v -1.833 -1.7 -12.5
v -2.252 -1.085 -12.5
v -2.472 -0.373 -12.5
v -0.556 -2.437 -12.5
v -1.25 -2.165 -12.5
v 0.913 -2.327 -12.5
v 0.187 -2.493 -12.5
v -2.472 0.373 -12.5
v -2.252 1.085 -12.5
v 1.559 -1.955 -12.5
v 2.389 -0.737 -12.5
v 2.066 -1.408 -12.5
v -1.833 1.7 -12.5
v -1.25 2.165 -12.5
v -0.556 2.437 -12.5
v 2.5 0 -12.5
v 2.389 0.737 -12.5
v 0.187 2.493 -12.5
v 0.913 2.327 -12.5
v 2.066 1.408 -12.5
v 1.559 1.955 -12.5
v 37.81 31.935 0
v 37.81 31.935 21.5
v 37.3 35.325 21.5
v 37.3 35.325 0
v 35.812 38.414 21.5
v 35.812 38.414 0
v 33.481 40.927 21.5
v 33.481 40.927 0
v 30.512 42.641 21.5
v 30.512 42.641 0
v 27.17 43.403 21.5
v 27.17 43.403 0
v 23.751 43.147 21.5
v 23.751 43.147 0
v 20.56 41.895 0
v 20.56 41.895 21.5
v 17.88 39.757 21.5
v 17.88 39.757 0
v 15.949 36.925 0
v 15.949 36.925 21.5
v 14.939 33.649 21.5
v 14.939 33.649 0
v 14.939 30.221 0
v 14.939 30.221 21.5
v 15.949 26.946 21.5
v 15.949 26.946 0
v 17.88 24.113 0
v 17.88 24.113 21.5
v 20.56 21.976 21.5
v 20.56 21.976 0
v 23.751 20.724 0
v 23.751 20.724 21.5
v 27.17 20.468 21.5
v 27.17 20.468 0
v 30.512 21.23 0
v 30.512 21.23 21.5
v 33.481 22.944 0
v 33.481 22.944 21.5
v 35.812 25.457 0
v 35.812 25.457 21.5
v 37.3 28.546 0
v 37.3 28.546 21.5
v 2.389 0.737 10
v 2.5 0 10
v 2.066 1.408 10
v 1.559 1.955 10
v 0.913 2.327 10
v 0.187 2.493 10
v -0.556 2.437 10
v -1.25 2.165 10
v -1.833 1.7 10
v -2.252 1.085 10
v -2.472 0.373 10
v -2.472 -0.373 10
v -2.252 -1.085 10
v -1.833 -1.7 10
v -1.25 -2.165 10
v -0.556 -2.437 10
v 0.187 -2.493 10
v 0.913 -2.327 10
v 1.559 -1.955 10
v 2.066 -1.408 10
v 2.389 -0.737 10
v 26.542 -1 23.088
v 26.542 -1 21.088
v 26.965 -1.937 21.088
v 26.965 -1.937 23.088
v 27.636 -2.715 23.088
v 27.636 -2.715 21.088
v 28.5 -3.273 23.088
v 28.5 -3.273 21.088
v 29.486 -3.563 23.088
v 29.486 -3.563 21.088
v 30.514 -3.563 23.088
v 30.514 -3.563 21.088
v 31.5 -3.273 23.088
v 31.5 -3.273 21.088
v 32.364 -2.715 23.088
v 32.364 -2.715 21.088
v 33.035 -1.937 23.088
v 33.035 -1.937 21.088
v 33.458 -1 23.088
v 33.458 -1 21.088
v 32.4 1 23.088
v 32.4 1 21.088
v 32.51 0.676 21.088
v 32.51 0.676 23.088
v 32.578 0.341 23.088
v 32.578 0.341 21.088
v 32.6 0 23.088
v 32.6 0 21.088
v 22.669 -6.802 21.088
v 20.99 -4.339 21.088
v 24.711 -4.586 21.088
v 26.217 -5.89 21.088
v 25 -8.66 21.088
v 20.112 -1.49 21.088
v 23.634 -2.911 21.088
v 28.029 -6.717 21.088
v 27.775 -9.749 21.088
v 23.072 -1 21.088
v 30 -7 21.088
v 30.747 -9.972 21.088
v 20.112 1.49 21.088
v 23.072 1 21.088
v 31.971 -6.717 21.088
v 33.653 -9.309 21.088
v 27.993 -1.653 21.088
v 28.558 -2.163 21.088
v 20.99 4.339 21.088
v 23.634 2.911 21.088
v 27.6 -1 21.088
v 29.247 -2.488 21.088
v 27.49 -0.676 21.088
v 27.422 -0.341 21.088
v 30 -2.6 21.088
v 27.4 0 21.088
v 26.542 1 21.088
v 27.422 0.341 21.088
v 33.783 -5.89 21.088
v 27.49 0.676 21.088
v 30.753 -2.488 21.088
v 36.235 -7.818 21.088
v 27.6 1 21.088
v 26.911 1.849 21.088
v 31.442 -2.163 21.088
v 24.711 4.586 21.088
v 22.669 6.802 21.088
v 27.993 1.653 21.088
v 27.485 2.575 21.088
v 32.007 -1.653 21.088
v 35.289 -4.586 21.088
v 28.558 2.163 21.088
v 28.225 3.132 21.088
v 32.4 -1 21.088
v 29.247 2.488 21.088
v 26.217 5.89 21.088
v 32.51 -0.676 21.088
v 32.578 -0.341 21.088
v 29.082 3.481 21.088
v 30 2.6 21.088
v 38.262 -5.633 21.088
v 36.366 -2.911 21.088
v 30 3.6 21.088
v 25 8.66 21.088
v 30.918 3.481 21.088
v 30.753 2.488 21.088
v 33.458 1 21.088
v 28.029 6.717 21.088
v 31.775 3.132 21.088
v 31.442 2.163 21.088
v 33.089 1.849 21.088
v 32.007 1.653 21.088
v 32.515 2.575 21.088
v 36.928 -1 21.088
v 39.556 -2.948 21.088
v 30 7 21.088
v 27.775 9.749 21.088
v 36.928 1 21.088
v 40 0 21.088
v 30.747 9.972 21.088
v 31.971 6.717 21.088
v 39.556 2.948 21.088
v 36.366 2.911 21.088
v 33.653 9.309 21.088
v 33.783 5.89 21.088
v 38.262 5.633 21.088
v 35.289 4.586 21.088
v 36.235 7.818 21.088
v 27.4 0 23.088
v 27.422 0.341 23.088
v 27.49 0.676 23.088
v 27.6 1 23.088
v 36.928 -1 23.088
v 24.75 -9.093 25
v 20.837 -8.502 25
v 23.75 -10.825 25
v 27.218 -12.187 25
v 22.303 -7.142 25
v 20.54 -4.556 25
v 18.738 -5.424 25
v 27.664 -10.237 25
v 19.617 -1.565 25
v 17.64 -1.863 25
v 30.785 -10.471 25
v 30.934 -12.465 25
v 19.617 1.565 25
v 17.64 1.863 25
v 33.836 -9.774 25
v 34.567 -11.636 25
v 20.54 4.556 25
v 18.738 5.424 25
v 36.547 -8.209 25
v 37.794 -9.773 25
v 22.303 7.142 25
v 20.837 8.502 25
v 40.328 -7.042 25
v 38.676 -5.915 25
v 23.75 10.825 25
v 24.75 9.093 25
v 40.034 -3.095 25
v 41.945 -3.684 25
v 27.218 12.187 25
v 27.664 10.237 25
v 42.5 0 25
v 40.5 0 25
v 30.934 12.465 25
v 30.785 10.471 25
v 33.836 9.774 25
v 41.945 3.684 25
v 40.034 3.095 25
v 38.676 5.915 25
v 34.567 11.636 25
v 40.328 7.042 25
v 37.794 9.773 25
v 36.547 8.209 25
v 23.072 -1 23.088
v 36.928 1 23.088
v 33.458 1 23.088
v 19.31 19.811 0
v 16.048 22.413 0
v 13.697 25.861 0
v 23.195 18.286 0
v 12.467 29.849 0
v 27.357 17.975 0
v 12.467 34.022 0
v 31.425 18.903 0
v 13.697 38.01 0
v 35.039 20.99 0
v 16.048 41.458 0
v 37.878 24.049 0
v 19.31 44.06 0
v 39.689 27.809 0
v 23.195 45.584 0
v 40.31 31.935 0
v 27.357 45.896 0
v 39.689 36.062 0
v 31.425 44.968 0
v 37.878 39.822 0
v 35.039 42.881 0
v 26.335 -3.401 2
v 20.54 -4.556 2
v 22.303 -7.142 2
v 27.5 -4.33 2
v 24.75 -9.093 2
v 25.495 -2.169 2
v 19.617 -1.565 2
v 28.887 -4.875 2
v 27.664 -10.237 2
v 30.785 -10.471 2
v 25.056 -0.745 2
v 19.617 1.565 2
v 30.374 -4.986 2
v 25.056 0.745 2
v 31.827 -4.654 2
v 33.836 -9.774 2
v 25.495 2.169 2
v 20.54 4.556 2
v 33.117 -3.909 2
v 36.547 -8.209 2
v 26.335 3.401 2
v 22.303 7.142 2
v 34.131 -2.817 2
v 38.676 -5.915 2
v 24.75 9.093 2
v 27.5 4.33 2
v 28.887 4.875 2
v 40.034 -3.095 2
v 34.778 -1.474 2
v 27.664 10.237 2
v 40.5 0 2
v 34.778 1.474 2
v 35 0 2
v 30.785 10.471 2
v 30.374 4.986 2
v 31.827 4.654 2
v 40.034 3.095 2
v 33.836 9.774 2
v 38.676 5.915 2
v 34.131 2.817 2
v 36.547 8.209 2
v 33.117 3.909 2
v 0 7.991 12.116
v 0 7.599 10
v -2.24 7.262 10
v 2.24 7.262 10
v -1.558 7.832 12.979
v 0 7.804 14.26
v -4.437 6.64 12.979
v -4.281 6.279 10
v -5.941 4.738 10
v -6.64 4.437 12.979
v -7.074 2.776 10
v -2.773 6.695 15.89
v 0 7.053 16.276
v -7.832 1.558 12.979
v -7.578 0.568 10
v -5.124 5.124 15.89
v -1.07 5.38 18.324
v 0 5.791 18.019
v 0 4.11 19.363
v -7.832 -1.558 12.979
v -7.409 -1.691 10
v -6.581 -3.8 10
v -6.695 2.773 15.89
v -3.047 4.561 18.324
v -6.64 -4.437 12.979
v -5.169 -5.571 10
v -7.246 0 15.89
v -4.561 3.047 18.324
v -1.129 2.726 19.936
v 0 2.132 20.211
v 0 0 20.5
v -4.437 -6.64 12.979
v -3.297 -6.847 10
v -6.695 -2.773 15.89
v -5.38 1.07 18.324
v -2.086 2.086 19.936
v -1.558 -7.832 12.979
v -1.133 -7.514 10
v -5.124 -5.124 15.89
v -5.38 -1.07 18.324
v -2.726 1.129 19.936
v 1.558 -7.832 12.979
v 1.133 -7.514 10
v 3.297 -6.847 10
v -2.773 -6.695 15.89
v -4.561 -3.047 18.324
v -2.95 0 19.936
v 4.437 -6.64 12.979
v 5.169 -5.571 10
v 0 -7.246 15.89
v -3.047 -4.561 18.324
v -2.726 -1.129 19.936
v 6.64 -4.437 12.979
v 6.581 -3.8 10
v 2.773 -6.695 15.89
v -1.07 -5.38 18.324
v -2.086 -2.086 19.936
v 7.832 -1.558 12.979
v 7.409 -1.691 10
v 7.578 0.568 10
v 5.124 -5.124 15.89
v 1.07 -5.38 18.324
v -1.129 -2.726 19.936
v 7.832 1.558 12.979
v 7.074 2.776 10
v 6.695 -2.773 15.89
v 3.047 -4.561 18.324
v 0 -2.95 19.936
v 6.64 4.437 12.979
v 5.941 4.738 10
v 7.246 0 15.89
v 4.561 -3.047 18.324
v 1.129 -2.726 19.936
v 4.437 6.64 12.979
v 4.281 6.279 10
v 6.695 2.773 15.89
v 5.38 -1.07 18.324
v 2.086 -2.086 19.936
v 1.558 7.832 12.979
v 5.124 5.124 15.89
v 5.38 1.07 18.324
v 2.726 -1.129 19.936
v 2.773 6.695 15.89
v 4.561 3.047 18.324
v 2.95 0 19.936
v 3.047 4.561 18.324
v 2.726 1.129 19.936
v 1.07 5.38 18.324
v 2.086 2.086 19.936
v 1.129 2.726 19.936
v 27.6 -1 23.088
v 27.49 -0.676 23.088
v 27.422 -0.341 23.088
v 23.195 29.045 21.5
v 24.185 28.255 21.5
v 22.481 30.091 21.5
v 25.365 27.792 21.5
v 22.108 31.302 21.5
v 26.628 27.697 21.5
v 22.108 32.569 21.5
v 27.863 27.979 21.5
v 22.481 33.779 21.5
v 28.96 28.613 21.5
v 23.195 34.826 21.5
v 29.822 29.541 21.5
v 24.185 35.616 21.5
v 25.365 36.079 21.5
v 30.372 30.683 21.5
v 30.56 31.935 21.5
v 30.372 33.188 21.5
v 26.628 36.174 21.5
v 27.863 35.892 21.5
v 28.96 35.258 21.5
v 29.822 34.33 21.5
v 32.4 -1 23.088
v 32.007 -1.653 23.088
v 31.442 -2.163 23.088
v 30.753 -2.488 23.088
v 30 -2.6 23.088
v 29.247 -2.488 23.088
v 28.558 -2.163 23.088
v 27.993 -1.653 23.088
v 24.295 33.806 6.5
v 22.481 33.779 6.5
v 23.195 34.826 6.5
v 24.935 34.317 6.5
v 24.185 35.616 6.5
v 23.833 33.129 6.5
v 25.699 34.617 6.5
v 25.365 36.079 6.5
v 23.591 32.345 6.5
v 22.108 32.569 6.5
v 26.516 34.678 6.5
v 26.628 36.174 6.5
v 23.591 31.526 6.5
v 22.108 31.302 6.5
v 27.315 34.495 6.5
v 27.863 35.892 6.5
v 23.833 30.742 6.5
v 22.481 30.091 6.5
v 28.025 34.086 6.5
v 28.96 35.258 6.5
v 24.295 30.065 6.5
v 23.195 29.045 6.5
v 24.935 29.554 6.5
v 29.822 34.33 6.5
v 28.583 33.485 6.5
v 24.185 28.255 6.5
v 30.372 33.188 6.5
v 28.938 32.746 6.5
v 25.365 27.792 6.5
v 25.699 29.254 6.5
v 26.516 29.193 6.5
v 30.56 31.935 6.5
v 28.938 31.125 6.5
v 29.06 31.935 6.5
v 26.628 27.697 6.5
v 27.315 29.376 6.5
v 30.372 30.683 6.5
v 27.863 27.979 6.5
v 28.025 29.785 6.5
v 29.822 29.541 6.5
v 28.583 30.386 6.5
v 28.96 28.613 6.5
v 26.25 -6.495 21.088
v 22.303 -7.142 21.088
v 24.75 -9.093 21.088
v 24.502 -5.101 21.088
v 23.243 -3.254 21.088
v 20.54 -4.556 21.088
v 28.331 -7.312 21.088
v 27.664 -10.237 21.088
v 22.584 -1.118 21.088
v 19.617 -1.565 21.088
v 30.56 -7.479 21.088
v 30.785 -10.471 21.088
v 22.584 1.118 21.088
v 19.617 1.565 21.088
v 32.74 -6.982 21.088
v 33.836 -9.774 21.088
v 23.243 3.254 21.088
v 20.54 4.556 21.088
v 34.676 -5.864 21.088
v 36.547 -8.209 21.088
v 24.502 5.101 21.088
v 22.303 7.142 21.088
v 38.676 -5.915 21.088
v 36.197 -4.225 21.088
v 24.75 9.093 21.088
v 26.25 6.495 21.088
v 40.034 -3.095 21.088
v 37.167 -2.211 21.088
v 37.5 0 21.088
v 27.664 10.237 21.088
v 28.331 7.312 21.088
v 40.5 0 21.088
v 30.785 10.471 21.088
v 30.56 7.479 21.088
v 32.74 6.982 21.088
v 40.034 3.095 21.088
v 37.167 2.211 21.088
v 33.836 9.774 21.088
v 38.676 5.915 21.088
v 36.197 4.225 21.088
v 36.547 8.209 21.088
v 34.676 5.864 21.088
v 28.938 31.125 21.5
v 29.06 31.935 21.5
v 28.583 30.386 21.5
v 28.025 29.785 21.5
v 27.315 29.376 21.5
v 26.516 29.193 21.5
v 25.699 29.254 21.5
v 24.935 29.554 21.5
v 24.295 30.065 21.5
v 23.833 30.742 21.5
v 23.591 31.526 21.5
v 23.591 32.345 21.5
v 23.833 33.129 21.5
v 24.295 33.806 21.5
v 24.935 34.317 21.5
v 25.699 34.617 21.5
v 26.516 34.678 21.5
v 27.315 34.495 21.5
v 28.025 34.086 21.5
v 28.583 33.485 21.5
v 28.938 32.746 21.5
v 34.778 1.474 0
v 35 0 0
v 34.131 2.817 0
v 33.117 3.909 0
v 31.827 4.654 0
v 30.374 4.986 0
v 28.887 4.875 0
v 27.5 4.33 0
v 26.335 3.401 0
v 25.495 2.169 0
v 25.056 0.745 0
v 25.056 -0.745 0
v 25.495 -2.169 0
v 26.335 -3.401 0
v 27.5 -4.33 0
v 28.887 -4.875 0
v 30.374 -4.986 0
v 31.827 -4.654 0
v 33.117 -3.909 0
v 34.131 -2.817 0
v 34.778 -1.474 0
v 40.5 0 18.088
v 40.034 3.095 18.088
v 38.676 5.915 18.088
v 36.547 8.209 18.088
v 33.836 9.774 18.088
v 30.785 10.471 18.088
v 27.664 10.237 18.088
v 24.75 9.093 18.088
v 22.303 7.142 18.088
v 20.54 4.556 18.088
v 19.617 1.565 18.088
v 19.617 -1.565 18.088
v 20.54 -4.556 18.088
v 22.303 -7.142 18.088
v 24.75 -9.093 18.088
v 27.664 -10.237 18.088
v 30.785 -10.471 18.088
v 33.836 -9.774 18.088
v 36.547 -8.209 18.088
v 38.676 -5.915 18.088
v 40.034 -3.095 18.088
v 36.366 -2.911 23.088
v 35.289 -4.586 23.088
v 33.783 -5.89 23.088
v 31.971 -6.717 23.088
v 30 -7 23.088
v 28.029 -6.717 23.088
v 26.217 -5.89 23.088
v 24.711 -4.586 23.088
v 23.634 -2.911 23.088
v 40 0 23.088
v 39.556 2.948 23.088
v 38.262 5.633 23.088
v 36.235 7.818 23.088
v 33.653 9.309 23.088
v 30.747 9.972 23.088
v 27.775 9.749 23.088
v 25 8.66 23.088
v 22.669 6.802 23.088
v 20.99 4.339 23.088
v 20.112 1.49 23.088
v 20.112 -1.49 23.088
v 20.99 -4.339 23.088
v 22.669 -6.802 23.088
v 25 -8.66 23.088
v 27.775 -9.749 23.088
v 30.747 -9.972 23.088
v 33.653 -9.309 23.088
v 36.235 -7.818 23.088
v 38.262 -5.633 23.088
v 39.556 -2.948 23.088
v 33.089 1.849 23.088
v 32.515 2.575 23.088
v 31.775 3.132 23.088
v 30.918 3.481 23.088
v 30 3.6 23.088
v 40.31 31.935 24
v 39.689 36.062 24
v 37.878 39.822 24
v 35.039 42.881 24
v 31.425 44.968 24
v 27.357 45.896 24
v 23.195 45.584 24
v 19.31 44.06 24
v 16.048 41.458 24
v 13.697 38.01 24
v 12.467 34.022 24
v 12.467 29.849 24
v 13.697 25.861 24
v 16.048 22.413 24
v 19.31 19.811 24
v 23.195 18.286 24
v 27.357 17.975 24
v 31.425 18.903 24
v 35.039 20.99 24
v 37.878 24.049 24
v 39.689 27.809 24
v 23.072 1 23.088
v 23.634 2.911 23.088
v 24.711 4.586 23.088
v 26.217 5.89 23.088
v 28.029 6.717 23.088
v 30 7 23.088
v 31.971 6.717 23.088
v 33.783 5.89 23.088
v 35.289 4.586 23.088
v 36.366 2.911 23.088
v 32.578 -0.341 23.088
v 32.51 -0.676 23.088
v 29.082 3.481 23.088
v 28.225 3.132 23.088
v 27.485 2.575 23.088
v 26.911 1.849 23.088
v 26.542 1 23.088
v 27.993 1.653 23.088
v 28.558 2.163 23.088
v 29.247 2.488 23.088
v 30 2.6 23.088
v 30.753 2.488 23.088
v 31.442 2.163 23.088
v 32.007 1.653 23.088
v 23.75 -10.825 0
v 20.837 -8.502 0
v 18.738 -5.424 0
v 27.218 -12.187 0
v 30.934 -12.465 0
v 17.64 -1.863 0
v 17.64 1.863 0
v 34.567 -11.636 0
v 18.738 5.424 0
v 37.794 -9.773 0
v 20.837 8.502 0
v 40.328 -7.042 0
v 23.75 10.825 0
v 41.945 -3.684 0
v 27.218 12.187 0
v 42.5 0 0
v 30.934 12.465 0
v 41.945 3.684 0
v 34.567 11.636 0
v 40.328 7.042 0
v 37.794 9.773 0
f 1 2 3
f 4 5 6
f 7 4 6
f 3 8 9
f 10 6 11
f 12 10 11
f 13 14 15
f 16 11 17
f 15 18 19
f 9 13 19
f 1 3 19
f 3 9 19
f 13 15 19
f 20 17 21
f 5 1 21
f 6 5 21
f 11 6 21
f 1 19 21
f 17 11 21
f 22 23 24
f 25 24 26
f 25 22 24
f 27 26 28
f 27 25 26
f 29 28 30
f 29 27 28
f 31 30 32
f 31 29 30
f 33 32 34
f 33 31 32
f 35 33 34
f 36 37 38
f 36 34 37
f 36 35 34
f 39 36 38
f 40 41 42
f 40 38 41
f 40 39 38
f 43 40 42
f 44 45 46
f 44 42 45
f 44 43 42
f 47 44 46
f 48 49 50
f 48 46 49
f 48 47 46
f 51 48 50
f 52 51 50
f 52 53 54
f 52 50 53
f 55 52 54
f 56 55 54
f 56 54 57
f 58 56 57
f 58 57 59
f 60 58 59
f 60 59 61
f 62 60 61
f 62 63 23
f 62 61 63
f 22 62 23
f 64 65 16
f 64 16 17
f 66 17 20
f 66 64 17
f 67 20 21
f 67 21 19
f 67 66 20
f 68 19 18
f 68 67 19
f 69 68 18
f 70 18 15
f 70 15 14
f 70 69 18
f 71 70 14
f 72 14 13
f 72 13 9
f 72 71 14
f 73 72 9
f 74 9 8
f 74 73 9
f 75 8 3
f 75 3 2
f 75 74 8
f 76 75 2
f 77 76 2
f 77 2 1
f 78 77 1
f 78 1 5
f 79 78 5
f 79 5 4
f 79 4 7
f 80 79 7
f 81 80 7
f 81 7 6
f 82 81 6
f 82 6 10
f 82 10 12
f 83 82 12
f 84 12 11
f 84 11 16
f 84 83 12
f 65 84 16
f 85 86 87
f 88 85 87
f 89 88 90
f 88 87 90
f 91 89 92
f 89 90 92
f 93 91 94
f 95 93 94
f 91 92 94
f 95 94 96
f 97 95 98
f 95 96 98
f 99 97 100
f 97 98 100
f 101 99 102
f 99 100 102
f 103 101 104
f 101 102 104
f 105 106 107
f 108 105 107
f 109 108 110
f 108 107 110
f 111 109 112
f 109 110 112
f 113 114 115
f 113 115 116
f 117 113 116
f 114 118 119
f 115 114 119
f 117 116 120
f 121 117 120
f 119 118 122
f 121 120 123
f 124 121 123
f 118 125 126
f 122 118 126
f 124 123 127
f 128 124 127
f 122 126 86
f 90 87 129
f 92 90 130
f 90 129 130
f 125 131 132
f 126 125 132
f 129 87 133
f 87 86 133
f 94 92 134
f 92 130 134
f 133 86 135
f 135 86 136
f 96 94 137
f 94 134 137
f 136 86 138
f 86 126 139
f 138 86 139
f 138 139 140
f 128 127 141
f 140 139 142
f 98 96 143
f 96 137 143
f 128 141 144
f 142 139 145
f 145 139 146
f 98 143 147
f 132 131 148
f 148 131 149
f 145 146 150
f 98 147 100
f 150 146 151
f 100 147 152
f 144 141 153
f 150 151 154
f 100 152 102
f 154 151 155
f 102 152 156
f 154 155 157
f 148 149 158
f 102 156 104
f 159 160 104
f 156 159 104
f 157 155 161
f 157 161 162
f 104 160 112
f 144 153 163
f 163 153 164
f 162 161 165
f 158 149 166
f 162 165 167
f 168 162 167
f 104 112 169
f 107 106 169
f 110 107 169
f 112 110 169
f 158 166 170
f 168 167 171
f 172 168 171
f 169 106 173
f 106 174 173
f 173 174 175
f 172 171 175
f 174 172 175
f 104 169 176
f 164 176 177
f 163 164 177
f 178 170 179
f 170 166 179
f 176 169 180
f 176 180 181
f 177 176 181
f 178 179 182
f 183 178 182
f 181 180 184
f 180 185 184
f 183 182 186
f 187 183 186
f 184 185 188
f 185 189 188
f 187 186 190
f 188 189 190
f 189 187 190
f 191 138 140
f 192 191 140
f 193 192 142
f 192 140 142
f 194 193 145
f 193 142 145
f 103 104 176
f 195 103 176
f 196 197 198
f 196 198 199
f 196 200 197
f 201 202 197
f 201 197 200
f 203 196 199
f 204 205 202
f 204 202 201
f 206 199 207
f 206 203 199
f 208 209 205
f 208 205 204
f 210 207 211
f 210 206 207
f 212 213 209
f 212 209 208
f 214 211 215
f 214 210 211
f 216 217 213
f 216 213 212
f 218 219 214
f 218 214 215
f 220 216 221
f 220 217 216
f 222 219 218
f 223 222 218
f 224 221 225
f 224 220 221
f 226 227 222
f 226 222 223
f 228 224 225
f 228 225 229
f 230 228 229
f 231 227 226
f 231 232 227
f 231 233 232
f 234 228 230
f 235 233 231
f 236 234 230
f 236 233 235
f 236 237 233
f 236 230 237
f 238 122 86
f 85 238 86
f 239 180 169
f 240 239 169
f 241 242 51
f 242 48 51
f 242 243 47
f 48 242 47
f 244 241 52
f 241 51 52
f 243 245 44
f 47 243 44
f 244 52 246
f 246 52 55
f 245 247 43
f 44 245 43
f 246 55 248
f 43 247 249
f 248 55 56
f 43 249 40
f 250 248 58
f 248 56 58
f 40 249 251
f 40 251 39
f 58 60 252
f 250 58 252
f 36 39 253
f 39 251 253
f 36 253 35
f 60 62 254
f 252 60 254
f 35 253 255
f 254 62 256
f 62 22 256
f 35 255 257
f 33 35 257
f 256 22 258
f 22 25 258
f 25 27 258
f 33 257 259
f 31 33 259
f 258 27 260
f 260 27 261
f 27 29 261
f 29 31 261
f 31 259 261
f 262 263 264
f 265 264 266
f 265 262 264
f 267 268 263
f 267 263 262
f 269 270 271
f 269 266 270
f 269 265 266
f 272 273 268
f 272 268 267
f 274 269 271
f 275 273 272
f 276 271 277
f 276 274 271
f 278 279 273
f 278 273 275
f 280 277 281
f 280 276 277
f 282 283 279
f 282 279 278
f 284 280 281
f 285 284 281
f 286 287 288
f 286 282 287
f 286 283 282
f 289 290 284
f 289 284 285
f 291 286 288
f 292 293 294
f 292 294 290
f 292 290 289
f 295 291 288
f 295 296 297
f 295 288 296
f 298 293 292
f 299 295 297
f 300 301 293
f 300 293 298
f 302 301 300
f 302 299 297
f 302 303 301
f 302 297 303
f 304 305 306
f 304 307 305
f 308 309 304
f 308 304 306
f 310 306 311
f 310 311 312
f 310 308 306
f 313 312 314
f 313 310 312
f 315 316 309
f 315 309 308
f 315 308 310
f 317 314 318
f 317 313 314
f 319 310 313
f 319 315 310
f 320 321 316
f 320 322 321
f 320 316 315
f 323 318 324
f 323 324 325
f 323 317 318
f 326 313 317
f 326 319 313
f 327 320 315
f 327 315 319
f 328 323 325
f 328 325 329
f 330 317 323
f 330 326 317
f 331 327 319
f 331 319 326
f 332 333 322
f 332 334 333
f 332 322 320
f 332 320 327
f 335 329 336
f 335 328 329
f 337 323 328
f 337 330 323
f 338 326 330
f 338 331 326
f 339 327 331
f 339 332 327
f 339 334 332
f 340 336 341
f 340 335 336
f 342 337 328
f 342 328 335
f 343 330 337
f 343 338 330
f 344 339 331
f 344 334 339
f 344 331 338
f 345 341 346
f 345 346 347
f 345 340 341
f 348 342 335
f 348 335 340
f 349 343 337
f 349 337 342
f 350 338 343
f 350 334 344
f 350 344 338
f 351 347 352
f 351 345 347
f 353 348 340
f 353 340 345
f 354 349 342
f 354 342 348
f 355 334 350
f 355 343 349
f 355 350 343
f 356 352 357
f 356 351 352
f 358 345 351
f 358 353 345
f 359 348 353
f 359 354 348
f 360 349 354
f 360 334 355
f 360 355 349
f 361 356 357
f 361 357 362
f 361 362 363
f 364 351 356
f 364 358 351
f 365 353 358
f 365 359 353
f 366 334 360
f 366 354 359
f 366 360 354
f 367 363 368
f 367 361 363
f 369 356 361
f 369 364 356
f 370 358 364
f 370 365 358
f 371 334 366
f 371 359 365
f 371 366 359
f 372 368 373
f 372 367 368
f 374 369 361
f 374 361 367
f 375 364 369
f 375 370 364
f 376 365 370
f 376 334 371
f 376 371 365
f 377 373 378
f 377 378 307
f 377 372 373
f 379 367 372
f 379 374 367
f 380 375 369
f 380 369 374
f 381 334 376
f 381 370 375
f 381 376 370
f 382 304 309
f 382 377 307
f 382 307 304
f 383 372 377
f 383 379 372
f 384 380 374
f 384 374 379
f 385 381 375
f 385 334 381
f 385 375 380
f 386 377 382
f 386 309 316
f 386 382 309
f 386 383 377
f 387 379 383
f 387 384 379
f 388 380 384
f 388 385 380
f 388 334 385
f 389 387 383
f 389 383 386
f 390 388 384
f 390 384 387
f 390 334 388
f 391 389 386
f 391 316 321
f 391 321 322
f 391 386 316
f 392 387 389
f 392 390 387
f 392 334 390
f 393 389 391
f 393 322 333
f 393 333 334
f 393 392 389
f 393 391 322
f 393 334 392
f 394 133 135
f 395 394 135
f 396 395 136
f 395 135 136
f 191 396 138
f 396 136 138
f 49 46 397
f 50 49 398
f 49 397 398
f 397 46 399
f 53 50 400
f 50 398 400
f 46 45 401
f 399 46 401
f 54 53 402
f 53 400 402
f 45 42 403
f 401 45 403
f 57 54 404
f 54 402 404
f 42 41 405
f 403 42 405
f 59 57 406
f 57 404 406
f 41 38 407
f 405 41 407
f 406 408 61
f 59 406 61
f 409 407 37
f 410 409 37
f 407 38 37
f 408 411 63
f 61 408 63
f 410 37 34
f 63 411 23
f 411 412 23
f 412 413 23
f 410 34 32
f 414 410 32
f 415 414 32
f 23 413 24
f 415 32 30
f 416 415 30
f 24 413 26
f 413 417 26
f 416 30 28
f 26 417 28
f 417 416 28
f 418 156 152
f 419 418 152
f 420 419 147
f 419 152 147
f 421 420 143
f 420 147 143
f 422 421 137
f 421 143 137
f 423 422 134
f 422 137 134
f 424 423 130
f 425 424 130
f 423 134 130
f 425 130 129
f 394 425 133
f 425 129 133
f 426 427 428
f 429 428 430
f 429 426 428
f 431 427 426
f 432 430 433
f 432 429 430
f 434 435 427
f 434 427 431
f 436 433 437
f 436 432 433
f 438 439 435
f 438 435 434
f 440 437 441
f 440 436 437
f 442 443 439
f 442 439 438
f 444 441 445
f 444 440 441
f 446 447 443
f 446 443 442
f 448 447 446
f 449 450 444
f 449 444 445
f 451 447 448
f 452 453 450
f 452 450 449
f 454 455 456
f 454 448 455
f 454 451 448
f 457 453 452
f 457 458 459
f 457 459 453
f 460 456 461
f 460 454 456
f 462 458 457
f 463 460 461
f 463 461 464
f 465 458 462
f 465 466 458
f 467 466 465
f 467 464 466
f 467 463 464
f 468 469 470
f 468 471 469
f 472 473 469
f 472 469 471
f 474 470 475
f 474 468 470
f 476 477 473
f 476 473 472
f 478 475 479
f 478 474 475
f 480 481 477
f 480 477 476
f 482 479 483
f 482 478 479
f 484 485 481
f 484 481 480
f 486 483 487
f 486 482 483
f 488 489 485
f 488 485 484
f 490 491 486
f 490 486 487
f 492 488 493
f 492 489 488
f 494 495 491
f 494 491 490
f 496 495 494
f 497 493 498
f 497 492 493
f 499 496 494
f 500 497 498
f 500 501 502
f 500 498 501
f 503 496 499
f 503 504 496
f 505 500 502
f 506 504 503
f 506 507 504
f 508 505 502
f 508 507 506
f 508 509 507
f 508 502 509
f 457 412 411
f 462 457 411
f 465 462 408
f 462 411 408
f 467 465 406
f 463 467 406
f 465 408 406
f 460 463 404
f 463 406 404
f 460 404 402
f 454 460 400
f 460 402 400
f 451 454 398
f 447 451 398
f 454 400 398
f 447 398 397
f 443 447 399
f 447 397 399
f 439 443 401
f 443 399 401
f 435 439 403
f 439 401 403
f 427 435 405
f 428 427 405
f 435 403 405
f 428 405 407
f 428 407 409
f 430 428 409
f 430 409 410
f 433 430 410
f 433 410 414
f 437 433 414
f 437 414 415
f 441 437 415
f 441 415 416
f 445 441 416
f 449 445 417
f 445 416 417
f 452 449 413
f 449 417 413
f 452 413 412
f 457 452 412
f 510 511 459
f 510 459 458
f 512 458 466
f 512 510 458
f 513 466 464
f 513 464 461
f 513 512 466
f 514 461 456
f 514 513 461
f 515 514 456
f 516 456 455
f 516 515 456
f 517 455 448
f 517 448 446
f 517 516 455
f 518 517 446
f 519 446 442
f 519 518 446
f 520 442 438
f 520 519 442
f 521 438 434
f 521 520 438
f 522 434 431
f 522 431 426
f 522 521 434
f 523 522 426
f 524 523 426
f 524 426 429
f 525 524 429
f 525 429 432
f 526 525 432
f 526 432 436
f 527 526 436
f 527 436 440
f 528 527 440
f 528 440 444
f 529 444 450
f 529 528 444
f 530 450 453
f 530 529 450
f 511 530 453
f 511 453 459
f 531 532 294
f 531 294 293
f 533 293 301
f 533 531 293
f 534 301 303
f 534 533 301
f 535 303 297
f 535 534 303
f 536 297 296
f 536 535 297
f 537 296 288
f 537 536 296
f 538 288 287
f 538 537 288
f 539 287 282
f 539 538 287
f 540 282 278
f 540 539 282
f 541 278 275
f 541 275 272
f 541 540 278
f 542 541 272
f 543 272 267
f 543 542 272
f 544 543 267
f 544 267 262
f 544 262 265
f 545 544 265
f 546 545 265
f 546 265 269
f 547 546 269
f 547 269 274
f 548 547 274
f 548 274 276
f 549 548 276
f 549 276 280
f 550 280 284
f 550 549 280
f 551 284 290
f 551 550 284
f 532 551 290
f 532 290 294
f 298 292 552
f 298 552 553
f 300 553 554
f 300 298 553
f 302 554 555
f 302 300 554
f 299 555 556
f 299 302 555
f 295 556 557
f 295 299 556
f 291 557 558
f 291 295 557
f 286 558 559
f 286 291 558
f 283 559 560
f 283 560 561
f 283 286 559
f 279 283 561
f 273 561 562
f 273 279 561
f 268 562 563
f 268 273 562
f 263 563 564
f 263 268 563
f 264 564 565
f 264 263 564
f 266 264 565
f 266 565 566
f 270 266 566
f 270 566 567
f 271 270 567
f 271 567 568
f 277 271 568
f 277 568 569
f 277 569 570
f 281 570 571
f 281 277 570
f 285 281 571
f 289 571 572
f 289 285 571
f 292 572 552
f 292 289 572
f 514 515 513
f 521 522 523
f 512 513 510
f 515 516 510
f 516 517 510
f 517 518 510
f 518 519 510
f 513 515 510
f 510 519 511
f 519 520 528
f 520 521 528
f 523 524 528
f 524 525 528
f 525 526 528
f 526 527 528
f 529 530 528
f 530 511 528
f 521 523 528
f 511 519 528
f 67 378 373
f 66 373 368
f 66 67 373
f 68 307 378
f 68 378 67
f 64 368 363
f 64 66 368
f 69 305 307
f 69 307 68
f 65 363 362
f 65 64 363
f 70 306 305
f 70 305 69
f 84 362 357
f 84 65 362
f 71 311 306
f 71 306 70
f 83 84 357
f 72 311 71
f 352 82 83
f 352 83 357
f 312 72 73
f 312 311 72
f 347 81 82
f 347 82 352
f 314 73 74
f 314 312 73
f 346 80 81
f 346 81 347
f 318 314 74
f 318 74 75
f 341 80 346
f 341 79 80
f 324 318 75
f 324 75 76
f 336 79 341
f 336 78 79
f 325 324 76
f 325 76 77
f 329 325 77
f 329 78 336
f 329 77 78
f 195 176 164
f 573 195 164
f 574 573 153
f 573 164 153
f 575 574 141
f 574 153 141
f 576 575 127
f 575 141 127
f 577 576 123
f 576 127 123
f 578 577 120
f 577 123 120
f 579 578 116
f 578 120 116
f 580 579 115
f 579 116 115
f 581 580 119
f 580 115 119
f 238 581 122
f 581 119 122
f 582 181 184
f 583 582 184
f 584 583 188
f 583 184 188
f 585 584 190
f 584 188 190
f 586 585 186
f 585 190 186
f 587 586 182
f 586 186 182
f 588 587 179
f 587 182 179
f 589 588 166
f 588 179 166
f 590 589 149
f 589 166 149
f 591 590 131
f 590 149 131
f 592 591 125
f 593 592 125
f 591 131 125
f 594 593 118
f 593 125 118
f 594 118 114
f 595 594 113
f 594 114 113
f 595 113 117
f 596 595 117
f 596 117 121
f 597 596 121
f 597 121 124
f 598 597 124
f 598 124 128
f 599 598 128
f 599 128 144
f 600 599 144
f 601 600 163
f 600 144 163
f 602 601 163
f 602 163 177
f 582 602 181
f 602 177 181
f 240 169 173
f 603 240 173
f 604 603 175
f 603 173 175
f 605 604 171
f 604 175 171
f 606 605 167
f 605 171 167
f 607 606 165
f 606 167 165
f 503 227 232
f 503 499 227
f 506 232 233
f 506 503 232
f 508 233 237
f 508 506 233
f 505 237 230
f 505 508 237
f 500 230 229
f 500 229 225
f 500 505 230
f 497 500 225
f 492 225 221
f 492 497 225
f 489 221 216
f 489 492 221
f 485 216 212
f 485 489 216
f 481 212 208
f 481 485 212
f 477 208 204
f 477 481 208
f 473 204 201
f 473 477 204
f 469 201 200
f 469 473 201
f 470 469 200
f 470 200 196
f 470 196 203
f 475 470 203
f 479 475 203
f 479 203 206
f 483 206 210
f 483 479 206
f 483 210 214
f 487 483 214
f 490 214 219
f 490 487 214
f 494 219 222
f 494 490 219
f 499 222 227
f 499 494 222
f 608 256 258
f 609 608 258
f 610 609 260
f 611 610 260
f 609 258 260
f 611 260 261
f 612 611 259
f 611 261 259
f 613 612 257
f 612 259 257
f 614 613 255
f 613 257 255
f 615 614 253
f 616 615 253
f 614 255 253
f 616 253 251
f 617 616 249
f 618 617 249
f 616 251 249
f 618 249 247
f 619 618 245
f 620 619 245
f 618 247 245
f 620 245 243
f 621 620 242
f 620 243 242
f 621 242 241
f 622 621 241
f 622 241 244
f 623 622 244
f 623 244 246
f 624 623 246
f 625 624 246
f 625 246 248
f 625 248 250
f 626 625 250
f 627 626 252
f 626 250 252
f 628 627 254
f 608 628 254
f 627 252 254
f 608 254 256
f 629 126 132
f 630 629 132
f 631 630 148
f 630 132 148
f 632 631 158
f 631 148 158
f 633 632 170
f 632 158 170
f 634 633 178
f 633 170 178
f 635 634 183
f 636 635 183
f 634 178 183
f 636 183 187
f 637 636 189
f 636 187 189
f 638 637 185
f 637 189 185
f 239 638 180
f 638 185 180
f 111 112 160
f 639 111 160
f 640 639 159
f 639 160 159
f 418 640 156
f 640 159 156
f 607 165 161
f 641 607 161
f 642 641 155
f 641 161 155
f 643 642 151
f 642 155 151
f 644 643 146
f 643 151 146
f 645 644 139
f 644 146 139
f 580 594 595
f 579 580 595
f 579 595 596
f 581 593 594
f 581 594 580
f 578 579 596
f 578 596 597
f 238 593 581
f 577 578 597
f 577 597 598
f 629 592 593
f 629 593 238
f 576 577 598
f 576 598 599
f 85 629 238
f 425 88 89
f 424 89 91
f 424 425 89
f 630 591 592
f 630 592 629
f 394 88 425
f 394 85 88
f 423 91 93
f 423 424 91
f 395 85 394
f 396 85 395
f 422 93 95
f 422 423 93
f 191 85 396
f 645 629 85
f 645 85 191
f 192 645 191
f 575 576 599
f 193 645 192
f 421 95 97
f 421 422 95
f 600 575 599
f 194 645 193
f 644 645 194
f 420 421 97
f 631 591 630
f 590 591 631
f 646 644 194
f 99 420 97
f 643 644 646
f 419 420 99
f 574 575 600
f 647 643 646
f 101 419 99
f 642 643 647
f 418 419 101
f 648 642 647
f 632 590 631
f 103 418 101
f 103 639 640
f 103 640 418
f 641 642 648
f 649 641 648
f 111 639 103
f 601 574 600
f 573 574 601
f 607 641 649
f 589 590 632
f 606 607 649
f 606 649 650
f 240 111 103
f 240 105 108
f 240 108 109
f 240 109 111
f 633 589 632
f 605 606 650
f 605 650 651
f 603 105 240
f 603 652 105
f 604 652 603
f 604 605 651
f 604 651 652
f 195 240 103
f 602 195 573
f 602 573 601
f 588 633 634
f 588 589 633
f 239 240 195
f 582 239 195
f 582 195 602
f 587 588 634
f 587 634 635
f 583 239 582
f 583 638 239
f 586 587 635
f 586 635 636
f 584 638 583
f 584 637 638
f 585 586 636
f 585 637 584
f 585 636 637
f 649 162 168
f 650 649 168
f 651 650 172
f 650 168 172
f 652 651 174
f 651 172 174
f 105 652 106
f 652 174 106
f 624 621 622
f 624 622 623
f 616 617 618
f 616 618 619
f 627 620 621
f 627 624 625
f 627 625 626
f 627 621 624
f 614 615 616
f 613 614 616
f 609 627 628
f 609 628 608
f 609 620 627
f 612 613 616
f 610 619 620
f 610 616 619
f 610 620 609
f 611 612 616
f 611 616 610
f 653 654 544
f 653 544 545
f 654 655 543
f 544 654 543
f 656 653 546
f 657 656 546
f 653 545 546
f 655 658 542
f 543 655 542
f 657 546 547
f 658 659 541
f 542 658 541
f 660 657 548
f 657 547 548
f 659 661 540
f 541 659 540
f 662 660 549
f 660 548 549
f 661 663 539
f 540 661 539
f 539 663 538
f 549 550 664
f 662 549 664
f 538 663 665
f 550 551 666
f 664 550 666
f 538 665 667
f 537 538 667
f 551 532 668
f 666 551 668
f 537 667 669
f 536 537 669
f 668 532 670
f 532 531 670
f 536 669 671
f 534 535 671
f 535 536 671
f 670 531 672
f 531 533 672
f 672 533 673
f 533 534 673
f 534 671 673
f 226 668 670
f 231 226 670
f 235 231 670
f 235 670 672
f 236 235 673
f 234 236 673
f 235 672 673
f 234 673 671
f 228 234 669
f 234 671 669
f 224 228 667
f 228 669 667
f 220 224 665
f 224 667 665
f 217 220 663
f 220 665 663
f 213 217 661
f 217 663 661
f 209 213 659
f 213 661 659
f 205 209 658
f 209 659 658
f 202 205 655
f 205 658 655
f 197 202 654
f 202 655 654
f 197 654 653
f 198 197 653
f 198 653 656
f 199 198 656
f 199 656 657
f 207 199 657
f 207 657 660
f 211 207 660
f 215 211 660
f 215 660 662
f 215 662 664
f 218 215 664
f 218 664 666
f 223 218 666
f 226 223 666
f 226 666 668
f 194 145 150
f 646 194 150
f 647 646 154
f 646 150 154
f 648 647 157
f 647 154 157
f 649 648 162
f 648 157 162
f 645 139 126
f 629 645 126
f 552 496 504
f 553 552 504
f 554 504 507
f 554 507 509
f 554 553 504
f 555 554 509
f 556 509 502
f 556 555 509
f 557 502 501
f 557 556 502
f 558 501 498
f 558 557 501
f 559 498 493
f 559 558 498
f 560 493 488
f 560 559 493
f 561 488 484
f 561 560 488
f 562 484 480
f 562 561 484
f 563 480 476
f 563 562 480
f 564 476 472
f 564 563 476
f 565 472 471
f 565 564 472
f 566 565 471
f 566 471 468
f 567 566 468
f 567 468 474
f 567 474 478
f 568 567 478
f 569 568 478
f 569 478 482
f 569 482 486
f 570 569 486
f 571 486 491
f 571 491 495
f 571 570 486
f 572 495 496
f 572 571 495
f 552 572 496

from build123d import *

# Parameters (mm, degrees)
F0_R      = 2.5
F1_DEPTH  = 12.5
F4_R      = 12.5
F4_R_2    = 5
F5_DEPTH  = 2
F8_R      = 10
F8_R_2    = 7.5
F9_DEPTH  = 2
F10_R     = 14
F11_DEPTH = 24
F12_T     = -2.5
F13_R     = 4.25
F13_R_2   = 2.75
F14_DEPTH = 15


with BuildPart() as f1:
    # F0 (on Top) → F1 (new body, symmetric)
    with BuildSketch(Plane.XY):
        Circle(F0_R)
    extrude(amount=F1_DEPTH, both=True)

    # F2 (on Right) → F3 (revolve)
    with BuildSketch(Plane.YZ):
        with BuildLine():
            Line((0, 10), (7.5993420768, 10))
            ThreePointArc((7.5993420768, 10), (6.4807406984, 17.1904157598), (0, 20.5))
            Line((0, 20.5), (0, 10))
        make_face()
    revolve(axis=Axis((0, 0, 15.25), (0, 0, 1)))


with BuildPart() as f5:
    # F4 (on Top) → F5 (new body)
    with BuildSketch(Plane.XY):
        with Locations((30, 0)):
            Circle(F4_R)
        with Locations((30, 0)):
            Circle(F4_R_2, mode=Mode.SUBTRACT)
    extrude(amount=F5_DEPTH)

    # F6 (on Front) → F7 (revolve)
    with BuildSketch(Plane.XZ):
        Polygon((40.5, 18.0880711675), (40.5, 0), (42.5, 0), (42.5, 25), (40.5, 25), (40.5, 21.0880711675), align=None)
        Polygon((37.5, 21.0880711675), (40.5, 18.0880711675), (40.5, 21.0880711675), align=None)
    revolve(axis=Axis((30, 0, 13.9748398215), (0, 0, 1)))


with BuildPart() as f9:
    # F8 (on face) → F9 (new body)
    with BuildSketch(Plane.XY.offset(21.0880711675)):
        with Locations((30, 0)):
            Circle(F8_R)
        with Locations((30, 0)):
            Circle(F8_R_2, mode=Mode.SUBTRACT)
        with Locations((30, 0)):
            Circle(F8_R_2)
        with BuildLine():
            ThreePointArc((36.9282032303, 1), (36.982027736, 0.5012870376), (37, 0))
            ThreePointArc((37, 0), (36.982027736, -0.5012870376), (36.9282032303, -1))
            ThreePointArc((36.9282032303, -1), (30, -7), (23.0717967697, -1))
            ThreePointArc((23.0717967697, -1), (23.017972264, -0.5012870376), (23, 0))
            ThreePointArc((23, 0), (23.017972264, 0.5012870376), (23.0717967697, 1))
            ThreePointArc((23.0717967697, 1), (25.417424305, 5.2915026221), (30, 7))
            ThreePointArc((30, 7), (34.582575695, 5.2915026221), (36.9282032303, 1))
        make_face(mode=Mode.SUBTRACT)
        with BuildLine():
            ThreePointArc((26.5416767068, -1), (30, -3.6), (33.4583232932, -1))
            Line((33.4583232932, -1), (32.4, -1))
            ThreePointArc((32.4, -1), (30, -2.6), (27.6, -1))
            Line((27.6, -1), (26.5416767068, -1))
        make_face()
        with BuildLine():
            ThreePointArc((36.9282032303, -1), (36.982027736, -0.5012870376), (37, 0))
            ThreePointArc((37, 0), (36.982027736, 0.5012870376), (36.9282032303, 1))
            Line((36.9282032303, 1), (33.4583232932, 1))
            ThreePointArc((33.4583232932, 1), (33.564404849, 0.5049931409), (33.6, 0))
            ThreePointArc((33.6, 0), (33.564404849, -0.5049931409), (33.4583232932, -1))
            Line((33.4583232932, -1), (36.9282032303, -1))
        make_face()
        with BuildLine():
            Line((30, 2.6), (30, 3.6))
            ThreePointArc((30, 3.6), (27.8366692347, 2.877498914), (26.5416767068, 1))
            Line((26.5416767068, 1), (27.6, 1))
            ThreePointArc((27.6, 1), (28.5577794898, 2.1633307653), (30, 2.6))
        make_face()
        with BuildLine():
            Line((32.4, 1), (33.4583232932, 1))
            ThreePointArc((33.4583232932, 1), (32.1633307653, 2.877498914), (30, 3.6))
            Line((30, 3.6), (30, 2.6))
            ThreePointArc((30, 2.6), (31.4422205102, 2.1633307653), (32.4, 1))
        make_face()
        with BuildLine():
            ThreePointArc((23, 0), (23.017972264, -0.5012870376), (23.0717967697, -1))
            Line((23.0717967697, -1), (26.5416767068, -1))
            ThreePointArc((26.5416767068, -1), (26.435595151, -0.5049931409), (26.4, 0))
            Line((26.4, 0), (23, 0))
        make_face()
        with BuildLine():
            Line((26.5416767068, 1), (23.0717967697, 1))
            ThreePointArc((23.0717967697, 1), (23.017972264, 0.5012870376), (23, 0))
            Line((23, 0), (26.4, 0))
            ThreePointArc((26.4, 0), (26.435595151, 0.5049931409), (26.5416767068, 1))
        make_face()
        with BuildLine():
            ThreePointArc((33.6, 0), (33.564404849, 0.5049931409), (33.4583232932, 1))
            Line((33.4583232932, 1), (32.4, 1))
            ThreePointArc((32.4, 1), (32.5495097568, 0.5099019514), (32.6, 0))
            ThreePointArc((32.6, 0), (32.5495097568, -0.5099019514), (32.4, -1))
            Line((32.4, -1), (33.4583232932, -1))
            ThreePointArc((33.4583232932, -1), (33.564404849, -0.5049931409), (33.6, 0))
        make_face()
        with BuildLine():
            Line((27.6, 1), (26.5416767068, 1))
            ThreePointArc((26.5416767068, 1), (26.435595151, 0.5049931409), (26.4, 0))
            Line((26.4, 0), (27.4, 0))
            ThreePointArc((27.4, 0), (27.4504902432, 0.5099019514), (27.6, 1))
        make_face()
        with BuildLine():
            ThreePointArc((26.4, 0), (26.435595151, -0.5049931409), (26.5416767068, -1))
            Line((26.5416767068, -1), (27.6, -1))
            ThreePointArc((27.6, -1), (27.4504902432, -0.5099019514), (27.4, 0))
            Line((27.4, 0), (26.4, 0))
        make_face()
    extrude(amount=F9_DEPTH)


with BuildPart() as f11:
    # F10 (on Top) → F11 (new body)
    with BuildSketch(Plane.XY):
        with Locations((26.310486719, 31.9354832172)):
            Circle(F10_R)
    extrude(amount=F11_DEPTH)

    # F12
    f12_openings = [f11.faces().sort_by_distance(p)[0] for p in [
        (26.310487, 31.935483, 0),
    ]]
    offset(amount=F12_T, openings=f12_openings)

    # F13 (on face) → F14 (join)
    with BuildSketch(Plane(origin=(0, 0, 21.5), x_dir=(1, 0, 0), z_dir=(0, 0, -1))):
        with Locations((26.310486719, -31.9354832172)):
            Circle(F13_R)
        with Locations((26.310486719, -31.9354832172)):
            Circle(F13_R_2, mode=Mode.SUBTRACT)
    extrude(amount=F14_DEPTH)


solid = Compound([f1.part, f5.part, f9.part, f11.part])
